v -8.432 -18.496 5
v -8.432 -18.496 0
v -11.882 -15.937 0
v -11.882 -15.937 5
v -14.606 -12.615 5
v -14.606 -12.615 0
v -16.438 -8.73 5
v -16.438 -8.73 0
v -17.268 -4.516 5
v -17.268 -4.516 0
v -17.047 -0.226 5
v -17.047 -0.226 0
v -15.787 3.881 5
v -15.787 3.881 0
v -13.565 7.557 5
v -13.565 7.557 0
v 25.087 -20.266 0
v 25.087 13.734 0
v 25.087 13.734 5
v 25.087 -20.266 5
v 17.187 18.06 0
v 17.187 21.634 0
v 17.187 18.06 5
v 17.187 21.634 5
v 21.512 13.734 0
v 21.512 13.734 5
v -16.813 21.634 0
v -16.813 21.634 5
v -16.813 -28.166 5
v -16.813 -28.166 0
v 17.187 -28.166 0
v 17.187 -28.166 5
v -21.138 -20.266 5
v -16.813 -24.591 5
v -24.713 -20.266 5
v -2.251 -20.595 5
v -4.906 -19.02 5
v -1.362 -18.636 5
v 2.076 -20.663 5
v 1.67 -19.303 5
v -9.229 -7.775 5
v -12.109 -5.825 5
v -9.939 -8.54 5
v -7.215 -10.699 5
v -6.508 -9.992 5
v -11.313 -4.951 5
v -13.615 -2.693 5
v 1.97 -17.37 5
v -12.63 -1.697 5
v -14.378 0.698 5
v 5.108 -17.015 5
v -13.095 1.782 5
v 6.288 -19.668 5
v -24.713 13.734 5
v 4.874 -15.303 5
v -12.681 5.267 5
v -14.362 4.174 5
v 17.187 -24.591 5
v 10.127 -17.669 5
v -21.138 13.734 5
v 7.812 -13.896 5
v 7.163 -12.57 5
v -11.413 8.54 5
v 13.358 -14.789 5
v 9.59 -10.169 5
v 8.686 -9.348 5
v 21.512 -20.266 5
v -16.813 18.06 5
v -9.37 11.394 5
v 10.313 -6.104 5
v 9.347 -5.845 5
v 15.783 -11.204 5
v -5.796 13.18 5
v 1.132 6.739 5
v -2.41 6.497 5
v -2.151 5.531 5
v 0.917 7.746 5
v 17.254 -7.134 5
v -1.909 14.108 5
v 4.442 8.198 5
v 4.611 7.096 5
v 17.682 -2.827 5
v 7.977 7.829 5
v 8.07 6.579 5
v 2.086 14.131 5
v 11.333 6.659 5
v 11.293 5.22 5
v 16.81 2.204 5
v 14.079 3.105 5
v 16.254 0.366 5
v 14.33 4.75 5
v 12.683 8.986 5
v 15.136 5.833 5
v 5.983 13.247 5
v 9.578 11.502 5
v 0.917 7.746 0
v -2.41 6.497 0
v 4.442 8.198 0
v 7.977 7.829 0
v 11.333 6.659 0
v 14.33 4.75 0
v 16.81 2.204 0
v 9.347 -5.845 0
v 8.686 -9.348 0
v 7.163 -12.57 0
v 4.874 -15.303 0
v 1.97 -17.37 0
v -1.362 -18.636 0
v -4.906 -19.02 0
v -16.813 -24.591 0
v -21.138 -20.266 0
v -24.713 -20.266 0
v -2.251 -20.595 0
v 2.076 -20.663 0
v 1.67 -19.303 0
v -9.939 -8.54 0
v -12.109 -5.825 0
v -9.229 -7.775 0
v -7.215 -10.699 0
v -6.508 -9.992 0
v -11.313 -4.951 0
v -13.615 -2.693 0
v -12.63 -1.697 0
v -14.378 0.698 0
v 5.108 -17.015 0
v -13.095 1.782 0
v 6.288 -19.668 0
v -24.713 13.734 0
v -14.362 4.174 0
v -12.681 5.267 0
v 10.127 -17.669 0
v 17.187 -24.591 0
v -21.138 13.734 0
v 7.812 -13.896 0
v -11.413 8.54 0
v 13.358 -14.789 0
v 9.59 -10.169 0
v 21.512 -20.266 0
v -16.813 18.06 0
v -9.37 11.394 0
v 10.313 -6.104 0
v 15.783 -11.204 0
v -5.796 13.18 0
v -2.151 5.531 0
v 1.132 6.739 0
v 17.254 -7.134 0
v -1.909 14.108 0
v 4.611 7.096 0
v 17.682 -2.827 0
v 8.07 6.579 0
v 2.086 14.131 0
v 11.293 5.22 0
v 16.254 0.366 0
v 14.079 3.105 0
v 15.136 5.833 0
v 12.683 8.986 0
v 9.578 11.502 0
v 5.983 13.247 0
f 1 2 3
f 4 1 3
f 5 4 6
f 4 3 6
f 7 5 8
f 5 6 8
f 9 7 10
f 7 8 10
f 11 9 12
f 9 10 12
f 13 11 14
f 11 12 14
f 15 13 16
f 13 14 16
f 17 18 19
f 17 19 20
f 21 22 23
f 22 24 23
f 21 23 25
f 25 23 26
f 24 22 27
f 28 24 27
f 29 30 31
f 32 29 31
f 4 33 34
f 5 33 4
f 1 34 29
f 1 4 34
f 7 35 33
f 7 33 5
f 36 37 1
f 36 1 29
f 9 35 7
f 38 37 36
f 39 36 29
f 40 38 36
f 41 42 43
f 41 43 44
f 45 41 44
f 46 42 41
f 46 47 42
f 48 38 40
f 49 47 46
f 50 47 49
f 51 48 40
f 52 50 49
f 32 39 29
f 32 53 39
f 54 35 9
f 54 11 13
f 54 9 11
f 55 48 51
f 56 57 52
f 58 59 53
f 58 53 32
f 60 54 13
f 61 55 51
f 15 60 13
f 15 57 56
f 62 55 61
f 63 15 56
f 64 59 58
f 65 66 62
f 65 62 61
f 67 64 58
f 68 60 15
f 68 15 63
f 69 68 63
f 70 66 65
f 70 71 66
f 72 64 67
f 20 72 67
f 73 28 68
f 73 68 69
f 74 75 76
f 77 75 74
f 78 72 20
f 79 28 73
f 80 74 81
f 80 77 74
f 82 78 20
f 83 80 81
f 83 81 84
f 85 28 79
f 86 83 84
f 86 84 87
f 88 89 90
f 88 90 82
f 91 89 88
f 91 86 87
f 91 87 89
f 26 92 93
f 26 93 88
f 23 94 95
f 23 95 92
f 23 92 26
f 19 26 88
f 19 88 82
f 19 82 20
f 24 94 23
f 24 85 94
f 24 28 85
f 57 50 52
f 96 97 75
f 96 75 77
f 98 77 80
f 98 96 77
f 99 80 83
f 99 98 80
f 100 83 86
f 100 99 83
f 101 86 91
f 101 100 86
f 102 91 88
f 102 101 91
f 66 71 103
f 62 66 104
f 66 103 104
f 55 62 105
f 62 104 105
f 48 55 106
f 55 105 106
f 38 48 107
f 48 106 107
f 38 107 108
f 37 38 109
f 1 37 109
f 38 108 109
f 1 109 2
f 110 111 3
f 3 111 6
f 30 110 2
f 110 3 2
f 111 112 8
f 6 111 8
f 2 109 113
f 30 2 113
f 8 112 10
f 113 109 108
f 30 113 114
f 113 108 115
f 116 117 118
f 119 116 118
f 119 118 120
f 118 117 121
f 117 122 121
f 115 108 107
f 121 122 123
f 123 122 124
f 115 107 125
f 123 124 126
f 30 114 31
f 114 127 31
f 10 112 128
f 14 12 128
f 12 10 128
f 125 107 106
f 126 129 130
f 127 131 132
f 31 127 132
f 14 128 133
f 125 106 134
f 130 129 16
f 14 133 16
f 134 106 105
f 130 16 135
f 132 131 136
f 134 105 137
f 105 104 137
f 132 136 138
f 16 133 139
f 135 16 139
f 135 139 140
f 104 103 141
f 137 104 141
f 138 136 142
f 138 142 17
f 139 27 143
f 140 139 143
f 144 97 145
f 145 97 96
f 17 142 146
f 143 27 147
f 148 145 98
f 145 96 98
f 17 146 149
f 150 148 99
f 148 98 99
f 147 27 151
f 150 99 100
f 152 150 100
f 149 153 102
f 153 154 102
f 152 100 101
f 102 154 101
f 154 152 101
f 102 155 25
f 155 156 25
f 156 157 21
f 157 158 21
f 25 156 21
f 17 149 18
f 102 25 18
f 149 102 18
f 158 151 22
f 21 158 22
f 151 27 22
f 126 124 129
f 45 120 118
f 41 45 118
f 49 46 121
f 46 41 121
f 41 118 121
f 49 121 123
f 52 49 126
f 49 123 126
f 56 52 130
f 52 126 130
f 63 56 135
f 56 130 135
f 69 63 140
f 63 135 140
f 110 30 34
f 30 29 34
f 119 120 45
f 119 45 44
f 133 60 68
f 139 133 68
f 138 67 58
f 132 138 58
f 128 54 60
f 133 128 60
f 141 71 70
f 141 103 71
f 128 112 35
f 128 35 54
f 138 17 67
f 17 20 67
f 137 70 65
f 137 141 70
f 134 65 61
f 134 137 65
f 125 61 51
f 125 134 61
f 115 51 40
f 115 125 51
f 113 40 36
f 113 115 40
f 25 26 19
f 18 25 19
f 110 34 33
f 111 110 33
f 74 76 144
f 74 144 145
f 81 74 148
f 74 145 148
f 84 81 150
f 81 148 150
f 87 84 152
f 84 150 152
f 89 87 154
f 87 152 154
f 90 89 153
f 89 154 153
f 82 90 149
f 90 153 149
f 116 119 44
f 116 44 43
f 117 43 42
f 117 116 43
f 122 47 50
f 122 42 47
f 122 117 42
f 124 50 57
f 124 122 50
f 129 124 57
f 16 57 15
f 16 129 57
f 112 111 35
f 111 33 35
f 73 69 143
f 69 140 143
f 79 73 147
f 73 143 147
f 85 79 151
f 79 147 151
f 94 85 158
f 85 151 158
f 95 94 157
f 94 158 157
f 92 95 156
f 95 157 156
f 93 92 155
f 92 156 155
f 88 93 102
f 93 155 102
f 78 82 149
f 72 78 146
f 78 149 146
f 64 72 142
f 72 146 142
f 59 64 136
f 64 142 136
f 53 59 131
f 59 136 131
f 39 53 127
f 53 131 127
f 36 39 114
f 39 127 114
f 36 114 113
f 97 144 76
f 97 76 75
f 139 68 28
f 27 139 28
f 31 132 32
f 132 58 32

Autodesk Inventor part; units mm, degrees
ref_plane "YZ Plane" through (0, 0, 0) normal (1, 0, 0) x (0, 1, 0)
ref_plane "XZ Plane" through (0, 0, 0) normal (0, 1, 0) x (-1, 0, 0)
ref_plane "XY Plane" through (0, 0, 0) normal (0, 0, 1) x (1, 0, 0)
sketch "Sketch1" plane through (0, 0, 0) normal (0, 0, 1) x (1, 0, 0)
  line L0 (21.5871, 13.6345) -> (17.0871, 18.1345) projected
  line L1 (17.0871, 18.1345) -> (-16.7129, 18.1345) projected
  line L2 (-16.7129, 18.1345) -> (-21.2129, 13.6345) projected
  line L3 (-21.0966, 13.6345) -> (-21.0966, -20.1655) projected
  line L4 (21.4709, -20.1655) -> (21.4709, 13.6345) projected
  line L5 (21.4709, -20.1655) -> (17.0871, -24.4078) projected
  line L6 (-16.7129, -24.4078) -> (17.0871, -24.4078) projected
  line L7 (-16.7129, -24.4078) -> (-21.0966, -20.1655) projected
  line L8 (-24.7129, -28.1655) -> (-24.7129, 13.6345) construction
  line L9 (25.0871, -28.1655) -> (-24.7129, -28.1655) construction
  line L10 (25.0871, -28.1655) -> (25.0871, 13.6345) construction
  line L11 (17.0871, 21.6345) -> (-16.7129, 21.6345) construction
  arc A0 (-2.2513, -20.5948) -> (10.3132, -6.1041) centre (-5.0595, -5.4673) ccw
  line L12 (9.3473, -5.8453) -> (10.3132, -6.1041)
  arc A1 (-8.4319, -18.4958) -> (9.3473, -5.8453) centre (-4.6285, -5.0223) ccw
  arc A2 (-13.5651, 7.557) -> (-7.2153, -10.699) centre (0.9173, 2.362) ccw
  line L13 (-6.5082, -9.9918) -> (-7.2153, -10.699)
  arc A3 (-9.3703, 11.3941) -> (-6.5082, -9.9918) centre (0.9045, 1.8847) ccw
  arc A4 (16.8103, 2.2043) -> (-2.4098, 6.4971) centre (4.6233, -7.1873) ccw
  line L14 (-2.1509, 5.5312) -> (-2.4098, 6.4971)
  arc A5 (17.6816, -2.8271) -> (-2.1509, 5.5312) centre (4.2873, -6.9006) ccw
  line L15 (0.1871, -36.5255) -> (0.1871, 21.9945)
  line L16 (14.6206, -3.2655) -> (-14.2825, -3.2655) construction
  line L17 (-21.0552, -20.0655) -> (-16.6129, -24.5078)
  line L18 (-16.6129, -24.5078) -> (-16.6129, -28.1655)
  line L19 (-16.6129, -28.1655) -> (16.9871, -28.1655)
  line L20 (16.9871, -28.1655) -> (16.9871, -24.5078)
  line L21 (16.9871, -24.5078) -> (21.4295, -20.0655)
  line L22 (25.0871, -20.0655) -> (21.4295, -20.0655)
  line L23 (25.0871, 13.5345) -> (25.0871, -20.0655)
  line L24 (21.4295, 13.5345) -> (25.0871, 13.5345)
  line L25 (21.4295, 13.5345) -> (16.9871, 17.9768)
  line L26 (16.9871, 17.9768) -> (16.9871, 21.6345)
  line L27 (16.9871, 21.6345) -> (-16.6129, 21.6345)
  line L28 (-16.6129, 21.6345) -> (-16.6129, 17.9768)
  line L29 (-16.6129, 17.9768) -> (-21.0552, 13.5345)
  line L30 (-24.7129, 13.5345) -> (-21.0552, 13.5345)
  line L31 (-24.7129, -20.0655) -> (-24.7129, 13.5345)
  line L32 (-21.0552, -20.0655) -> (-24.7129, -20.0655)
  circle A6 centre (0.1871, -3.2655) radius 17.5
  point P0 (0, 0)
  point P1 (14.2, -44.8454)
  point P2 (9.8303, -5.9747)
  point P3 (0, 0)
  point P4 (16.9871, 19.8057)
  dimension "d48" = 35
  dimension "d49" = 1
  dimension "d50" = 1
  dimension "d51" = 1
extrude "Extrusion1" add sketch "Sketch1" along normal blind 5 contours L26 L25 L24 L4 L22 L21 L6 L15 A6 L1 | L1 L15 L27 L26 | L15 A6 L6 L17 L32 L3 L30 L29 L28 L1 | L1 L28 L27 L15 | L15 A5 L14 A4 | A4 A6 A5 L15 | A3 L13 A2 A6 | L24 L23 L22 L4 | L3 L32 L31 L30 | L15 A0 A6 A1 | A1 L12 A0 L15 | L21 L20 L19 L15 L6 | L15 L19 L18 L17 L6
sketch "Skizze3" plane through (0, 0, 5) normal (0, 0, 1) x (1, 0, 0)
  arc A0 (-2.2513, -20.5948) -> (17.6816, -2.8271) centre (0.1871, -3.2655) ccw construction
  arc A1 (-2.2513, -20.5948) -> (10.3132, -6.1041) centre (-5.0595, -5.4673) ccw construction
  line L0 (10.3132, -6.1041) -> (9.3473, -5.8453) construction
  arc A2 (-8.4319, -18.4958) -> (9.3473, -5.8453) centre (-4.6285, -5.0223) ccw construction
  arc A3 (-13.5651, 7.557) -> (-8.4319, -18.4958) centre (0.1871, -3.2655) ccw construction
  arc A4 (-13.5651, 7.557) -> (-7.2153, -10.699) centre (0.9173, 2.362) ccw construction
  line L1 (-7.2153, -10.699) -> (-6.5082, -9.9918) construction
  arc A5 (-9.3703, 11.3941) -> (-6.5082, -9.9918) centre (0.9045, 1.8847) ccw construction
  arc A6 (16.8103, 2.2043) -> (-9.3703, 11.3941) centre (0.1871, -3.2655) ccw construction
  arc A7 (16.8103, 2.2043) -> (-2.4098, 6.4971) centre (4.6233, -7.1873) ccw construction
  line L2 (-2.4098, 6.4971) -> (-2.1509, 5.5312) construction
  arc A8 (17.6816, -2.8271) -> (-2.1509, 5.5312) centre (4.2873, -6.9006) ccw construction
  line L3 (-21.0552, -20.0655) -> (-16.6129, -24.5078) projected
  line L4 (-16.6129, -24.5078) -> (-16.6129, -28.1655) projected
  line L5 (-16.6129, -28.1655) -> (16.9871, -28.1655) construction
  line L6 (16.9871, -28.1655) -> (16.9871, -24.5078) projected
  line L7 (16.9871, -24.5078) -> (21.4295, -20.0655) projected
  line L8 (21.4295, -20.0655) -> (25.0871, -20.0655) projected
  line L9 (25.0871, -20.0655) -> (25.0871, 13.5345) construction
  line L10 (25.0871, 13.5345) -> (21.4295, 13.5345) projected
  line L11 (21.4295, 13.5345) -> (16.9871, 17.9768) projected
  line L12 (16.9871, 17.9768) -> (16.9871, 21.6345) projected
  line L13 (16.9871, 21.6345) -> (-16.6129, 21.6345) construction
  line L14 (-16.6129, 21.6345) -> (-16.6129, 17.9768) projected
  line L15 (-16.6129, 17.9768) -> (-21.0552, 13.5345) projected
  line L16 (-21.0552, 13.5345) -> (-24.7129, 13.5345) projected
  line L17 (-24.7129, 13.5345) -> (-24.7129, -20.0655) construction
  line L18 (-24.7129, -20.0655) -> (-21.0552, -20.0655) projected
  line L19 (-16.8129, 21.8345) -> (17.1871, 21.8345) construction
  line L20 (17.1871, 21.8345) -> (17.1871, 18.0597)
  line L21 (17.1871, 18.0597) -> (21.5123, 13.7345)
  line L22 (21.5123, 13.7345) -> (25.2871, 13.7345)
  line L23 (25.2871, 13.7345) -> (25.2871, -20.2655) construction
  line L24 (25.2871, -20.2655) -> (21.5123, -20.2655)
  line L25 (21.5123, -20.2655) -> (17.1871, -24.5907)
  line L26 (17.1871, -24.5907) -> (17.1871, -28.3655)
  line L27 (17.1871, -28.3655) -> (-16.8129, -28.3655) construction
  line L28 (-16.8129, -28.3655) -> (-16.8129, -24.5907)
  line L29 (-16.8129, -24.5907) -> (-21.1381, -20.2655)
  line L30 (-21.1381, -20.2655) -> (-24.9129, -20.2655)
  line L31 (-24.9129, -20.2655) -> (-24.9129, 13.7345) construction
  line L32 (-24.9129, 13.7345) -> (-21.1381, 13.7345)
  line L33 (-21.1381, 13.7345) -> (-16.8129, 18.0597)
  line L34 (-16.8129, 18.0597) -> (-16.8129, 21.8345)
  line L35 (-21.0552, 13.5345) -> (-24.7129, 13.5345) projected
  line L36 (-24.7129, 13.5345) -> (-24.7129, 13.7345)
  line L37 (-16.6129, 21.6345) -> (-16.8129, 21.6345)
  line L38 (16.9871, 21.6345) -> (17.1871, 21.6345)
  line L39 (25.0871, 13.5345) -> (25.0871, 13.7345)
  line L40 (25.0871, -20.0655) -> (25.0871, -20.2655)
  line L41 (-16.6129, -28.1655) -> (16.9871, -28.1655) projected
  line L42 (16.9871, -28.1655) -> (17.1871, -28.1655)
  line L43 (-16.6129, -28.1655) -> (-16.8129, -28.1655)
  line L44 (-24.7129, -20.0655) -> (-24.7129, -20.2655)
  point P0 (0, 0)
  dimension "d52" = 0.2
extrude "IM_offset" add sketch "Skizze3" against normal up to surface (5 mm away)
properties part number "20_Cube_Insert_Holder-okular+flashlight_v3"
